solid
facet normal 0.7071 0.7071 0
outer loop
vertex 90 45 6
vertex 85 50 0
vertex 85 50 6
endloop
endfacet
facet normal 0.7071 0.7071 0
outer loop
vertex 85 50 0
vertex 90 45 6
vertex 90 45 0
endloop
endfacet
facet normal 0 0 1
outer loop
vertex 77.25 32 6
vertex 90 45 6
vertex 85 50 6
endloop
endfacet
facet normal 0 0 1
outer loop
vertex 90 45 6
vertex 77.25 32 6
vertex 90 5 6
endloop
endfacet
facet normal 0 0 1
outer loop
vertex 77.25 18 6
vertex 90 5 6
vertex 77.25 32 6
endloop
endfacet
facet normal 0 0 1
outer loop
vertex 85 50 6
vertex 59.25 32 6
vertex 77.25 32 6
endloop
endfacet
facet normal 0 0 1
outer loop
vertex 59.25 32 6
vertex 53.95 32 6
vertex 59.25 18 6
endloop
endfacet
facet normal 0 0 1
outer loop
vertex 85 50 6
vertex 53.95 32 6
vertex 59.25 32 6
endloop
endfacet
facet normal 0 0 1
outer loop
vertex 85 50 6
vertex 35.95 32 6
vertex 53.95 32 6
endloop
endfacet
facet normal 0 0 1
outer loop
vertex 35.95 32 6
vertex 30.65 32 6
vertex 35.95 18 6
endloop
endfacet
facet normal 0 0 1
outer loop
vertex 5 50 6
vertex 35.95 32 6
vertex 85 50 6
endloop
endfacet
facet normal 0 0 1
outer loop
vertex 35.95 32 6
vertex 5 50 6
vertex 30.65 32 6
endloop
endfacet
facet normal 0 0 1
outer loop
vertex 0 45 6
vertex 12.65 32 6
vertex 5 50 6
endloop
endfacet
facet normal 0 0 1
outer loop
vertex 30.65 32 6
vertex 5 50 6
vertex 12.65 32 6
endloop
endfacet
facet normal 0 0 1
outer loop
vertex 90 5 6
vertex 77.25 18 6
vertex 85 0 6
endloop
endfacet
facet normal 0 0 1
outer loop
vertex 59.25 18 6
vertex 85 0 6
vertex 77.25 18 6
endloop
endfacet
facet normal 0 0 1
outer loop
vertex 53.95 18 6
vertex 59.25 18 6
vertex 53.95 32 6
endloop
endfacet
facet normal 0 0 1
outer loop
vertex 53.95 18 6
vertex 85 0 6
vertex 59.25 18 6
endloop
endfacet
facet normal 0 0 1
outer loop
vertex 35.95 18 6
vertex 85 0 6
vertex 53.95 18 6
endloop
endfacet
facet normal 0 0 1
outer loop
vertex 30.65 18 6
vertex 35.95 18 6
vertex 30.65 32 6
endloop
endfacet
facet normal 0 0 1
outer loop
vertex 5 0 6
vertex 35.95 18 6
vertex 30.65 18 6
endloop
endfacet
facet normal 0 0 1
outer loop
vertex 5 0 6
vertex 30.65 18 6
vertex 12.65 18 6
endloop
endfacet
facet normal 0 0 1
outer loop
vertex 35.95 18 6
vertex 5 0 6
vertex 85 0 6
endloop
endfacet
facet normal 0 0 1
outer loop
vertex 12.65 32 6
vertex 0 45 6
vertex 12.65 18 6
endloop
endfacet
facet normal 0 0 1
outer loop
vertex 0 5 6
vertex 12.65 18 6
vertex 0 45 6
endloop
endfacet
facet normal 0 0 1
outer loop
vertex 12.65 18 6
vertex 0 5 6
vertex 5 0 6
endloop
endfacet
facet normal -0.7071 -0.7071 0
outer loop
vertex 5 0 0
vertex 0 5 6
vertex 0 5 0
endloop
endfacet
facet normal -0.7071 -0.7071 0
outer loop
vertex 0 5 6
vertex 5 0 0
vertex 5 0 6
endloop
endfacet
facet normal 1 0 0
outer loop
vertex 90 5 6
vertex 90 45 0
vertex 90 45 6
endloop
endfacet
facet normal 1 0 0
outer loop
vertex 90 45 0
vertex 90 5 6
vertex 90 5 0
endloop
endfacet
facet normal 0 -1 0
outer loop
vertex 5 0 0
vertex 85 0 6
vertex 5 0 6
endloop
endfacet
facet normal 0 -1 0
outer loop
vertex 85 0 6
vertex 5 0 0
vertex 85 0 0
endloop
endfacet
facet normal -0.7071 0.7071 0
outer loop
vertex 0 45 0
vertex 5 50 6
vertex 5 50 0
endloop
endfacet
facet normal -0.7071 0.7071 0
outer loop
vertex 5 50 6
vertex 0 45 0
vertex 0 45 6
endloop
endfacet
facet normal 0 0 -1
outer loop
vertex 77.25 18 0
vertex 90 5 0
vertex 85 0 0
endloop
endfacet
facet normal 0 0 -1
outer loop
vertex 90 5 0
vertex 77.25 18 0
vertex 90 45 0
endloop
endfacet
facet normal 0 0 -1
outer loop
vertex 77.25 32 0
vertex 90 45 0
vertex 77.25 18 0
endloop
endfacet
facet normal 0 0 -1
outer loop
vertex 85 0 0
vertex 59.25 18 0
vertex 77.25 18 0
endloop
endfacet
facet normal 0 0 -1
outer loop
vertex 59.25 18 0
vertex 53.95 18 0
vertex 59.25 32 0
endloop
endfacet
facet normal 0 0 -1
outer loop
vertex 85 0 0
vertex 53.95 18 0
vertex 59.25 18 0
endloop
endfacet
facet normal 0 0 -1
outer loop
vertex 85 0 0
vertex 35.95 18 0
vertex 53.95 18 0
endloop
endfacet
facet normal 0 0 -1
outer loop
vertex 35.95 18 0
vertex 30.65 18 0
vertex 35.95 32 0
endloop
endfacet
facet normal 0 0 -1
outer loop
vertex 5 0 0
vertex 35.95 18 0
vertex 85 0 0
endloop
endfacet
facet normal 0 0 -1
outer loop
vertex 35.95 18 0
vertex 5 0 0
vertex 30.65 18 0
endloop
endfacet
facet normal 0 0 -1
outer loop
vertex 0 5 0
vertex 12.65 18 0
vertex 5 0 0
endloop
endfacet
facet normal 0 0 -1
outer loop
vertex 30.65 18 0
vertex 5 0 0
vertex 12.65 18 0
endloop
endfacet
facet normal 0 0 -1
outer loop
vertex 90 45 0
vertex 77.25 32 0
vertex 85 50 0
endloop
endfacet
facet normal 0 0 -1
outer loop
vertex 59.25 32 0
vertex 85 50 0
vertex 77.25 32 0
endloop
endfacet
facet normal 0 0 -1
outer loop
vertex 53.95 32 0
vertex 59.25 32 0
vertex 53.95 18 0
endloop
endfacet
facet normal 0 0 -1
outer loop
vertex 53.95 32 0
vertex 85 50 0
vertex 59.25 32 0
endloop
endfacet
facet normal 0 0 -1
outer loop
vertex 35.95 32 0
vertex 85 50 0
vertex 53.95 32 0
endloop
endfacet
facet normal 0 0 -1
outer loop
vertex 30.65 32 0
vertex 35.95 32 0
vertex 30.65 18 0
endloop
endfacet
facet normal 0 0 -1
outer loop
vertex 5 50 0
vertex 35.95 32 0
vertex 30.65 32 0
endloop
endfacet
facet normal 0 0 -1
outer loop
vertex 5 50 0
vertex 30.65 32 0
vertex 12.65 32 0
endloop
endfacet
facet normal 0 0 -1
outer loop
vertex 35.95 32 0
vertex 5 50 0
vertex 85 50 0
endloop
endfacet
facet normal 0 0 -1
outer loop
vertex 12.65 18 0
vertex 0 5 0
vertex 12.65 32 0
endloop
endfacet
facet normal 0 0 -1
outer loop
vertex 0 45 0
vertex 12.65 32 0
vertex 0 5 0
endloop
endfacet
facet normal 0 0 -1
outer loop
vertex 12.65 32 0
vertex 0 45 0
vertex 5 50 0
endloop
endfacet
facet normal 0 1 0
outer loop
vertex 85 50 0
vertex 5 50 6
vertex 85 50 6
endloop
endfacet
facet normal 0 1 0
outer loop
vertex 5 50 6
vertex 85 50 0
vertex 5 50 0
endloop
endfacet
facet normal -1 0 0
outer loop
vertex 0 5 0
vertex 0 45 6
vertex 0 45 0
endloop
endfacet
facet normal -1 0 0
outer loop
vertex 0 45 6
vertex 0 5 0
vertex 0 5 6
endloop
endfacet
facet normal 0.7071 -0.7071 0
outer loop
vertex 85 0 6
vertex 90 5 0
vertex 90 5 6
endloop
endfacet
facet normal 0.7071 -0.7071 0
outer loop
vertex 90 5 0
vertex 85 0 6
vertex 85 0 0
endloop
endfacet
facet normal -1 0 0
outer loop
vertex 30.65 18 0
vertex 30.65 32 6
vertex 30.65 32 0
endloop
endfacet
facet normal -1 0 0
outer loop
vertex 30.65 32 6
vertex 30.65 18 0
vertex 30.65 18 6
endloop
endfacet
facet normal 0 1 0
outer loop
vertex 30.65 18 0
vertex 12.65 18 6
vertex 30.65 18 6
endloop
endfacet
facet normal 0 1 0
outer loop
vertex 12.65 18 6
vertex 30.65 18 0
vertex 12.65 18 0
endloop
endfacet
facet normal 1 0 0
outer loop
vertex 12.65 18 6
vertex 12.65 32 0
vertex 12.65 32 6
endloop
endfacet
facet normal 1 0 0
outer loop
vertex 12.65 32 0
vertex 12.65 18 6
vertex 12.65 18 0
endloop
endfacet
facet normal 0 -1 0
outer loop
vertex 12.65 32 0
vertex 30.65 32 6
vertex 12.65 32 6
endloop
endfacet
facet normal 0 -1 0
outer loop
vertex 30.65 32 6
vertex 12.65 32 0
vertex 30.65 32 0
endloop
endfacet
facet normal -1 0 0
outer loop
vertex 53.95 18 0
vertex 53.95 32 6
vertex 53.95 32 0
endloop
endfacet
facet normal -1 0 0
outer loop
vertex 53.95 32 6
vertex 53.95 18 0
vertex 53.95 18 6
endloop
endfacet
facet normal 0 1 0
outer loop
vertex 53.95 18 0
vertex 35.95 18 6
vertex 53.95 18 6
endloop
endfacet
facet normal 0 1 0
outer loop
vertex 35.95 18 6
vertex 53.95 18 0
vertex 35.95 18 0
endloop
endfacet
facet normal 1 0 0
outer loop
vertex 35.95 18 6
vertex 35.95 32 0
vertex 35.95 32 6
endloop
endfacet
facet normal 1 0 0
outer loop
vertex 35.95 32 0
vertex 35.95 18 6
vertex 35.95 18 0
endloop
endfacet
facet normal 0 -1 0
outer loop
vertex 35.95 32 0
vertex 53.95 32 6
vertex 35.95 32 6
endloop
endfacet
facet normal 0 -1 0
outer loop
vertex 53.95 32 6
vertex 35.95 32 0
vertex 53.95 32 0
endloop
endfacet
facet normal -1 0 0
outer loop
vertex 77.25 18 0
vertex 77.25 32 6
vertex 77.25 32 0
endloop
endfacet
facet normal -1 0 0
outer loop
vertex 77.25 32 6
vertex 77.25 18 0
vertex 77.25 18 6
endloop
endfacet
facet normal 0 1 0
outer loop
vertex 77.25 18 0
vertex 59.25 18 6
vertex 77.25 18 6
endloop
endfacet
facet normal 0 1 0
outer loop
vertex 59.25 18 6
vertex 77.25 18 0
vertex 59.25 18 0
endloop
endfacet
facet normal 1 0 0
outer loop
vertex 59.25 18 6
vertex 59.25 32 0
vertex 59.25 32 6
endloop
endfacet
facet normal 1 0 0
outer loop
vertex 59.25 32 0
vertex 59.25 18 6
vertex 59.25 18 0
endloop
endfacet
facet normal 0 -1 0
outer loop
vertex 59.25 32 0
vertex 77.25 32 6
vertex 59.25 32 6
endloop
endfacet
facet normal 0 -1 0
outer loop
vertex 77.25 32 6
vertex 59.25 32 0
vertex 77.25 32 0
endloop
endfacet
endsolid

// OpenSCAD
$fn = 32;

// ----------------------------------------------------------------------
// Windowed plate: 3 voids, 90 x 50 x 6 mm
// ----------------------------------------------------------------------

// --- parameters (mm) ---
plate_l = 90;             // plate length, X
plate_w = 50;             // plate width, Y
plate_t = 6;              // plate thickness, Z
edge_margin = 10;         // wall from the plate edge to any window
windows = 3;              // number of windows in the row
win_l = 18;               // window length
win_w = 14;               // window width
win_pitch = 23.3;         // window pitch along X
depth_1 = 6;              // depth of void 1 (full thickness = through)
depth_2 = 6;              // depth of void 2 (full thickness = through)
depth_3 = 6;              // depth of void 3 (full thickness = through)
corner_c = 5;             // corner chamfer of the plate

profile = [[5, 0], [85, 0], [90, 5], [90, 45], [85, 50], [5, 50], [0, 45], [0, 5]];  // primary outline, 8 points, counter clockwise
void_1 = [[12.65, 18], [30.65, 18], [30.65, 32], [12.65, 32]];  // window 1 of the row, 4 points
void_2 = [[35.95, 18], [53.95, 18], [53.95, 32], [35.95, 32]];  // window 2 of the row, 4 points
void_3 = [[59.25, 18], [77.25, 18], [77.25, 32], [59.25, 32]];  // window 3 of the row, 4 points

// --- the one profile operation ---
difference() {
  linear_extrude(height = plate_t) polygon(points = profile);
  translate([0, 0, -1])
    linear_extrude(height = plate_t + 2) polygon(points = void_1);
  translate([0, 0, -1])
    linear_extrude(height = plate_t + 2) polygon(points = void_2);
  translate([0, 0, -1])
    linear_extrude(height = plate_t + 2) polygon(points = void_3);
}
